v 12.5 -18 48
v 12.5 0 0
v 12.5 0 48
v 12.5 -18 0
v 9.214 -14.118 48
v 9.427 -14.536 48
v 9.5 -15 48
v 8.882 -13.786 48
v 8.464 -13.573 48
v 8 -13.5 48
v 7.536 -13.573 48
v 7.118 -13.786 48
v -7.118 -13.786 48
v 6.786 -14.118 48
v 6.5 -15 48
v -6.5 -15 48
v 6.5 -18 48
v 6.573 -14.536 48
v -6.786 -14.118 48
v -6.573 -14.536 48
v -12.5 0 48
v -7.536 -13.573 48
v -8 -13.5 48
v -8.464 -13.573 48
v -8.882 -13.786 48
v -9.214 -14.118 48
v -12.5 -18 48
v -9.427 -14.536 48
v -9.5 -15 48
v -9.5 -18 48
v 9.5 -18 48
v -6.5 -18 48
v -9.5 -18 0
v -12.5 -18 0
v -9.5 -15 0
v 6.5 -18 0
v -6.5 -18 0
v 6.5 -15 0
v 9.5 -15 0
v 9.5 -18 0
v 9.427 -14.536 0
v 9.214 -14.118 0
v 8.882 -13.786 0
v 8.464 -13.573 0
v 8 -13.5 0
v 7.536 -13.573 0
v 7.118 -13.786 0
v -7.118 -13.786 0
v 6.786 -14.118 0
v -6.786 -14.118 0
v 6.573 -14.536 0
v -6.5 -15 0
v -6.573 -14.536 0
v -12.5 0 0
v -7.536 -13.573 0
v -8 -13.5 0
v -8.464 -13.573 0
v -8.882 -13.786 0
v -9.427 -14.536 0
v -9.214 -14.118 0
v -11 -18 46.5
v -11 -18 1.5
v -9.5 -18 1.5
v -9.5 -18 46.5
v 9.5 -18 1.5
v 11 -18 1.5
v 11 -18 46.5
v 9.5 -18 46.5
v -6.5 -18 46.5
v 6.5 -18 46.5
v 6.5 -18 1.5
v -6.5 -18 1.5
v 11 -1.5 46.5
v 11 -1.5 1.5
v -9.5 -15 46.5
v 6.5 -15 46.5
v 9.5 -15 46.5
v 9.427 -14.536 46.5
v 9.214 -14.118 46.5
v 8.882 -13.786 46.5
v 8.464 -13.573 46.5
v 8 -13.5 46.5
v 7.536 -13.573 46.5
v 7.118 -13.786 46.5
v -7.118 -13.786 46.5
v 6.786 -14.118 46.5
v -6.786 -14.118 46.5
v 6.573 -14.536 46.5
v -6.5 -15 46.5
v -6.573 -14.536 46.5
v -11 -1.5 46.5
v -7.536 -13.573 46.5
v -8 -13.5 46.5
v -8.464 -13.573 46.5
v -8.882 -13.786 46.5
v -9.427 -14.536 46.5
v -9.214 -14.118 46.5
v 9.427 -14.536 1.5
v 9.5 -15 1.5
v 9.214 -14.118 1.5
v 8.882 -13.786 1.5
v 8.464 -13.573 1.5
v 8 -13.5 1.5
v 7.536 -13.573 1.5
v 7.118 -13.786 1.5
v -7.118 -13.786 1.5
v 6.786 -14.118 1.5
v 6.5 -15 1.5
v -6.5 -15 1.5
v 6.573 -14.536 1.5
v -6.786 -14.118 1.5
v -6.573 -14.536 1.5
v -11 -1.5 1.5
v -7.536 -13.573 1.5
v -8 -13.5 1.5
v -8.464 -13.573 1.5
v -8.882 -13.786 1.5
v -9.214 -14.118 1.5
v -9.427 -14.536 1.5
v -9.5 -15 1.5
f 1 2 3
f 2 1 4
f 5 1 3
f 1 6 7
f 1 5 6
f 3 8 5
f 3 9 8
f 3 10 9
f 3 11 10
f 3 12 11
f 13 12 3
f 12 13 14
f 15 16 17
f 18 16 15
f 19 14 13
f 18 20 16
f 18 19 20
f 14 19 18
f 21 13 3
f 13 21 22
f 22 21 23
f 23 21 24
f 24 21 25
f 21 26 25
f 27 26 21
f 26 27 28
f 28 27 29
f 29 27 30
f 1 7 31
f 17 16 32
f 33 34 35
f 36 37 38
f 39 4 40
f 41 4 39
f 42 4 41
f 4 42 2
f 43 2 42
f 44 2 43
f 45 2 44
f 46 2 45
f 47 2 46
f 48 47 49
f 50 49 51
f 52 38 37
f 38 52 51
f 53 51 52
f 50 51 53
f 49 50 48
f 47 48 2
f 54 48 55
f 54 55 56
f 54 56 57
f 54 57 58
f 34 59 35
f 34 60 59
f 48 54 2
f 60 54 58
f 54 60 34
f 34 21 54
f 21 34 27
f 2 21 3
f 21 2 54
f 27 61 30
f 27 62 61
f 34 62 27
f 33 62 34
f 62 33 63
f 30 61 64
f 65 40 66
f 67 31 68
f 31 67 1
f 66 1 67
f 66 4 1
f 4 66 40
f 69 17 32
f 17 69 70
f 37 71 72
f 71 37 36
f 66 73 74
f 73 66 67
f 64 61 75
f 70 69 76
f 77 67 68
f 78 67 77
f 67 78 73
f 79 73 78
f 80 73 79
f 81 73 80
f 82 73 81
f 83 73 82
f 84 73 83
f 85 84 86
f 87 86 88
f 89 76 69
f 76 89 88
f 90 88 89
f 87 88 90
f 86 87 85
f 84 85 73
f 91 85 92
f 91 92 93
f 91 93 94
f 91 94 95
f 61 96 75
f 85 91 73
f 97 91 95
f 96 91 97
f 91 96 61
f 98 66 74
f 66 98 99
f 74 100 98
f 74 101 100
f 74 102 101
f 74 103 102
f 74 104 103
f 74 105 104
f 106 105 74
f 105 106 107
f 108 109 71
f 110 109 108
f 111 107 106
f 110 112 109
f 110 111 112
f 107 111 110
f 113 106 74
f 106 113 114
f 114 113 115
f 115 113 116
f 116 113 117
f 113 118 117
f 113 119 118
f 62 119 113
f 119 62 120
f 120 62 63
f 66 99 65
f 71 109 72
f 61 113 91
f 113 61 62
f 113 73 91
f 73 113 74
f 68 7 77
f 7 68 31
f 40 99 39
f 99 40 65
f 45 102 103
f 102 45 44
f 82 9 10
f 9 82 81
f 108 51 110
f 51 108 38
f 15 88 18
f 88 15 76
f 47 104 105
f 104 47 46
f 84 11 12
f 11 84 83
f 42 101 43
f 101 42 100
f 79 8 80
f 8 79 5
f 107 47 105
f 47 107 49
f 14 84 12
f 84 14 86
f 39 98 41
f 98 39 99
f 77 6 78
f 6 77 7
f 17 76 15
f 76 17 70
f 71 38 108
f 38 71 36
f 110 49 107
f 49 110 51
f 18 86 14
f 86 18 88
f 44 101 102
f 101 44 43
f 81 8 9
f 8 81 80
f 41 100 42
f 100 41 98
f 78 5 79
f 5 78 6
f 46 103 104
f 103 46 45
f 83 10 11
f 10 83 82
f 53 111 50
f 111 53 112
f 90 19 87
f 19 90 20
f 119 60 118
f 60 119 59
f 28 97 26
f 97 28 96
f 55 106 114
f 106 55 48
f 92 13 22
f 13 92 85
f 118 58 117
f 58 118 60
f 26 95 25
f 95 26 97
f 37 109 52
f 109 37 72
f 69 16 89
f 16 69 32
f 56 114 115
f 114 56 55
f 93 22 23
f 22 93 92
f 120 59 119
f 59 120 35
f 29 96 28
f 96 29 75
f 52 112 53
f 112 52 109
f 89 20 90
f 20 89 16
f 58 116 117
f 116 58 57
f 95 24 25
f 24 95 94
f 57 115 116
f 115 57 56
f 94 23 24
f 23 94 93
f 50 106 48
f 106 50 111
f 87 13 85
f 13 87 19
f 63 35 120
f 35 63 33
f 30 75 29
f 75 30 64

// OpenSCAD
$fn=20;

union() {
    th = 1.5;
    // 45 x 22 x 15
    iw = 22;
    ih = 15+th;
    id = 45;
    ow = iw + 2*th;
    oh = ih + th;
    od = id + 2*th;
    difference() {
        translate([-ow/2, -oh, 0]) cube([ow, oh, od]);
        translate([-iw/2, -ih-th-1, th]) cube([iw, ih+1, id]);
        offset = 8;
        hull() {
            translate([offset, -ih+th, -5]) cylinder(d = 3, h = 60);
            translate([offset, -ih-th, -5]) cylinder(d = 3, h = 60);
        }
        hull() {
            translate([-offset, -ih+th, -5]) cylinder(d = 3, h = 60);
            translate([-offset, -ih-th, -5]) cylinder(d = 3, h = 60);
        }
    }
}
